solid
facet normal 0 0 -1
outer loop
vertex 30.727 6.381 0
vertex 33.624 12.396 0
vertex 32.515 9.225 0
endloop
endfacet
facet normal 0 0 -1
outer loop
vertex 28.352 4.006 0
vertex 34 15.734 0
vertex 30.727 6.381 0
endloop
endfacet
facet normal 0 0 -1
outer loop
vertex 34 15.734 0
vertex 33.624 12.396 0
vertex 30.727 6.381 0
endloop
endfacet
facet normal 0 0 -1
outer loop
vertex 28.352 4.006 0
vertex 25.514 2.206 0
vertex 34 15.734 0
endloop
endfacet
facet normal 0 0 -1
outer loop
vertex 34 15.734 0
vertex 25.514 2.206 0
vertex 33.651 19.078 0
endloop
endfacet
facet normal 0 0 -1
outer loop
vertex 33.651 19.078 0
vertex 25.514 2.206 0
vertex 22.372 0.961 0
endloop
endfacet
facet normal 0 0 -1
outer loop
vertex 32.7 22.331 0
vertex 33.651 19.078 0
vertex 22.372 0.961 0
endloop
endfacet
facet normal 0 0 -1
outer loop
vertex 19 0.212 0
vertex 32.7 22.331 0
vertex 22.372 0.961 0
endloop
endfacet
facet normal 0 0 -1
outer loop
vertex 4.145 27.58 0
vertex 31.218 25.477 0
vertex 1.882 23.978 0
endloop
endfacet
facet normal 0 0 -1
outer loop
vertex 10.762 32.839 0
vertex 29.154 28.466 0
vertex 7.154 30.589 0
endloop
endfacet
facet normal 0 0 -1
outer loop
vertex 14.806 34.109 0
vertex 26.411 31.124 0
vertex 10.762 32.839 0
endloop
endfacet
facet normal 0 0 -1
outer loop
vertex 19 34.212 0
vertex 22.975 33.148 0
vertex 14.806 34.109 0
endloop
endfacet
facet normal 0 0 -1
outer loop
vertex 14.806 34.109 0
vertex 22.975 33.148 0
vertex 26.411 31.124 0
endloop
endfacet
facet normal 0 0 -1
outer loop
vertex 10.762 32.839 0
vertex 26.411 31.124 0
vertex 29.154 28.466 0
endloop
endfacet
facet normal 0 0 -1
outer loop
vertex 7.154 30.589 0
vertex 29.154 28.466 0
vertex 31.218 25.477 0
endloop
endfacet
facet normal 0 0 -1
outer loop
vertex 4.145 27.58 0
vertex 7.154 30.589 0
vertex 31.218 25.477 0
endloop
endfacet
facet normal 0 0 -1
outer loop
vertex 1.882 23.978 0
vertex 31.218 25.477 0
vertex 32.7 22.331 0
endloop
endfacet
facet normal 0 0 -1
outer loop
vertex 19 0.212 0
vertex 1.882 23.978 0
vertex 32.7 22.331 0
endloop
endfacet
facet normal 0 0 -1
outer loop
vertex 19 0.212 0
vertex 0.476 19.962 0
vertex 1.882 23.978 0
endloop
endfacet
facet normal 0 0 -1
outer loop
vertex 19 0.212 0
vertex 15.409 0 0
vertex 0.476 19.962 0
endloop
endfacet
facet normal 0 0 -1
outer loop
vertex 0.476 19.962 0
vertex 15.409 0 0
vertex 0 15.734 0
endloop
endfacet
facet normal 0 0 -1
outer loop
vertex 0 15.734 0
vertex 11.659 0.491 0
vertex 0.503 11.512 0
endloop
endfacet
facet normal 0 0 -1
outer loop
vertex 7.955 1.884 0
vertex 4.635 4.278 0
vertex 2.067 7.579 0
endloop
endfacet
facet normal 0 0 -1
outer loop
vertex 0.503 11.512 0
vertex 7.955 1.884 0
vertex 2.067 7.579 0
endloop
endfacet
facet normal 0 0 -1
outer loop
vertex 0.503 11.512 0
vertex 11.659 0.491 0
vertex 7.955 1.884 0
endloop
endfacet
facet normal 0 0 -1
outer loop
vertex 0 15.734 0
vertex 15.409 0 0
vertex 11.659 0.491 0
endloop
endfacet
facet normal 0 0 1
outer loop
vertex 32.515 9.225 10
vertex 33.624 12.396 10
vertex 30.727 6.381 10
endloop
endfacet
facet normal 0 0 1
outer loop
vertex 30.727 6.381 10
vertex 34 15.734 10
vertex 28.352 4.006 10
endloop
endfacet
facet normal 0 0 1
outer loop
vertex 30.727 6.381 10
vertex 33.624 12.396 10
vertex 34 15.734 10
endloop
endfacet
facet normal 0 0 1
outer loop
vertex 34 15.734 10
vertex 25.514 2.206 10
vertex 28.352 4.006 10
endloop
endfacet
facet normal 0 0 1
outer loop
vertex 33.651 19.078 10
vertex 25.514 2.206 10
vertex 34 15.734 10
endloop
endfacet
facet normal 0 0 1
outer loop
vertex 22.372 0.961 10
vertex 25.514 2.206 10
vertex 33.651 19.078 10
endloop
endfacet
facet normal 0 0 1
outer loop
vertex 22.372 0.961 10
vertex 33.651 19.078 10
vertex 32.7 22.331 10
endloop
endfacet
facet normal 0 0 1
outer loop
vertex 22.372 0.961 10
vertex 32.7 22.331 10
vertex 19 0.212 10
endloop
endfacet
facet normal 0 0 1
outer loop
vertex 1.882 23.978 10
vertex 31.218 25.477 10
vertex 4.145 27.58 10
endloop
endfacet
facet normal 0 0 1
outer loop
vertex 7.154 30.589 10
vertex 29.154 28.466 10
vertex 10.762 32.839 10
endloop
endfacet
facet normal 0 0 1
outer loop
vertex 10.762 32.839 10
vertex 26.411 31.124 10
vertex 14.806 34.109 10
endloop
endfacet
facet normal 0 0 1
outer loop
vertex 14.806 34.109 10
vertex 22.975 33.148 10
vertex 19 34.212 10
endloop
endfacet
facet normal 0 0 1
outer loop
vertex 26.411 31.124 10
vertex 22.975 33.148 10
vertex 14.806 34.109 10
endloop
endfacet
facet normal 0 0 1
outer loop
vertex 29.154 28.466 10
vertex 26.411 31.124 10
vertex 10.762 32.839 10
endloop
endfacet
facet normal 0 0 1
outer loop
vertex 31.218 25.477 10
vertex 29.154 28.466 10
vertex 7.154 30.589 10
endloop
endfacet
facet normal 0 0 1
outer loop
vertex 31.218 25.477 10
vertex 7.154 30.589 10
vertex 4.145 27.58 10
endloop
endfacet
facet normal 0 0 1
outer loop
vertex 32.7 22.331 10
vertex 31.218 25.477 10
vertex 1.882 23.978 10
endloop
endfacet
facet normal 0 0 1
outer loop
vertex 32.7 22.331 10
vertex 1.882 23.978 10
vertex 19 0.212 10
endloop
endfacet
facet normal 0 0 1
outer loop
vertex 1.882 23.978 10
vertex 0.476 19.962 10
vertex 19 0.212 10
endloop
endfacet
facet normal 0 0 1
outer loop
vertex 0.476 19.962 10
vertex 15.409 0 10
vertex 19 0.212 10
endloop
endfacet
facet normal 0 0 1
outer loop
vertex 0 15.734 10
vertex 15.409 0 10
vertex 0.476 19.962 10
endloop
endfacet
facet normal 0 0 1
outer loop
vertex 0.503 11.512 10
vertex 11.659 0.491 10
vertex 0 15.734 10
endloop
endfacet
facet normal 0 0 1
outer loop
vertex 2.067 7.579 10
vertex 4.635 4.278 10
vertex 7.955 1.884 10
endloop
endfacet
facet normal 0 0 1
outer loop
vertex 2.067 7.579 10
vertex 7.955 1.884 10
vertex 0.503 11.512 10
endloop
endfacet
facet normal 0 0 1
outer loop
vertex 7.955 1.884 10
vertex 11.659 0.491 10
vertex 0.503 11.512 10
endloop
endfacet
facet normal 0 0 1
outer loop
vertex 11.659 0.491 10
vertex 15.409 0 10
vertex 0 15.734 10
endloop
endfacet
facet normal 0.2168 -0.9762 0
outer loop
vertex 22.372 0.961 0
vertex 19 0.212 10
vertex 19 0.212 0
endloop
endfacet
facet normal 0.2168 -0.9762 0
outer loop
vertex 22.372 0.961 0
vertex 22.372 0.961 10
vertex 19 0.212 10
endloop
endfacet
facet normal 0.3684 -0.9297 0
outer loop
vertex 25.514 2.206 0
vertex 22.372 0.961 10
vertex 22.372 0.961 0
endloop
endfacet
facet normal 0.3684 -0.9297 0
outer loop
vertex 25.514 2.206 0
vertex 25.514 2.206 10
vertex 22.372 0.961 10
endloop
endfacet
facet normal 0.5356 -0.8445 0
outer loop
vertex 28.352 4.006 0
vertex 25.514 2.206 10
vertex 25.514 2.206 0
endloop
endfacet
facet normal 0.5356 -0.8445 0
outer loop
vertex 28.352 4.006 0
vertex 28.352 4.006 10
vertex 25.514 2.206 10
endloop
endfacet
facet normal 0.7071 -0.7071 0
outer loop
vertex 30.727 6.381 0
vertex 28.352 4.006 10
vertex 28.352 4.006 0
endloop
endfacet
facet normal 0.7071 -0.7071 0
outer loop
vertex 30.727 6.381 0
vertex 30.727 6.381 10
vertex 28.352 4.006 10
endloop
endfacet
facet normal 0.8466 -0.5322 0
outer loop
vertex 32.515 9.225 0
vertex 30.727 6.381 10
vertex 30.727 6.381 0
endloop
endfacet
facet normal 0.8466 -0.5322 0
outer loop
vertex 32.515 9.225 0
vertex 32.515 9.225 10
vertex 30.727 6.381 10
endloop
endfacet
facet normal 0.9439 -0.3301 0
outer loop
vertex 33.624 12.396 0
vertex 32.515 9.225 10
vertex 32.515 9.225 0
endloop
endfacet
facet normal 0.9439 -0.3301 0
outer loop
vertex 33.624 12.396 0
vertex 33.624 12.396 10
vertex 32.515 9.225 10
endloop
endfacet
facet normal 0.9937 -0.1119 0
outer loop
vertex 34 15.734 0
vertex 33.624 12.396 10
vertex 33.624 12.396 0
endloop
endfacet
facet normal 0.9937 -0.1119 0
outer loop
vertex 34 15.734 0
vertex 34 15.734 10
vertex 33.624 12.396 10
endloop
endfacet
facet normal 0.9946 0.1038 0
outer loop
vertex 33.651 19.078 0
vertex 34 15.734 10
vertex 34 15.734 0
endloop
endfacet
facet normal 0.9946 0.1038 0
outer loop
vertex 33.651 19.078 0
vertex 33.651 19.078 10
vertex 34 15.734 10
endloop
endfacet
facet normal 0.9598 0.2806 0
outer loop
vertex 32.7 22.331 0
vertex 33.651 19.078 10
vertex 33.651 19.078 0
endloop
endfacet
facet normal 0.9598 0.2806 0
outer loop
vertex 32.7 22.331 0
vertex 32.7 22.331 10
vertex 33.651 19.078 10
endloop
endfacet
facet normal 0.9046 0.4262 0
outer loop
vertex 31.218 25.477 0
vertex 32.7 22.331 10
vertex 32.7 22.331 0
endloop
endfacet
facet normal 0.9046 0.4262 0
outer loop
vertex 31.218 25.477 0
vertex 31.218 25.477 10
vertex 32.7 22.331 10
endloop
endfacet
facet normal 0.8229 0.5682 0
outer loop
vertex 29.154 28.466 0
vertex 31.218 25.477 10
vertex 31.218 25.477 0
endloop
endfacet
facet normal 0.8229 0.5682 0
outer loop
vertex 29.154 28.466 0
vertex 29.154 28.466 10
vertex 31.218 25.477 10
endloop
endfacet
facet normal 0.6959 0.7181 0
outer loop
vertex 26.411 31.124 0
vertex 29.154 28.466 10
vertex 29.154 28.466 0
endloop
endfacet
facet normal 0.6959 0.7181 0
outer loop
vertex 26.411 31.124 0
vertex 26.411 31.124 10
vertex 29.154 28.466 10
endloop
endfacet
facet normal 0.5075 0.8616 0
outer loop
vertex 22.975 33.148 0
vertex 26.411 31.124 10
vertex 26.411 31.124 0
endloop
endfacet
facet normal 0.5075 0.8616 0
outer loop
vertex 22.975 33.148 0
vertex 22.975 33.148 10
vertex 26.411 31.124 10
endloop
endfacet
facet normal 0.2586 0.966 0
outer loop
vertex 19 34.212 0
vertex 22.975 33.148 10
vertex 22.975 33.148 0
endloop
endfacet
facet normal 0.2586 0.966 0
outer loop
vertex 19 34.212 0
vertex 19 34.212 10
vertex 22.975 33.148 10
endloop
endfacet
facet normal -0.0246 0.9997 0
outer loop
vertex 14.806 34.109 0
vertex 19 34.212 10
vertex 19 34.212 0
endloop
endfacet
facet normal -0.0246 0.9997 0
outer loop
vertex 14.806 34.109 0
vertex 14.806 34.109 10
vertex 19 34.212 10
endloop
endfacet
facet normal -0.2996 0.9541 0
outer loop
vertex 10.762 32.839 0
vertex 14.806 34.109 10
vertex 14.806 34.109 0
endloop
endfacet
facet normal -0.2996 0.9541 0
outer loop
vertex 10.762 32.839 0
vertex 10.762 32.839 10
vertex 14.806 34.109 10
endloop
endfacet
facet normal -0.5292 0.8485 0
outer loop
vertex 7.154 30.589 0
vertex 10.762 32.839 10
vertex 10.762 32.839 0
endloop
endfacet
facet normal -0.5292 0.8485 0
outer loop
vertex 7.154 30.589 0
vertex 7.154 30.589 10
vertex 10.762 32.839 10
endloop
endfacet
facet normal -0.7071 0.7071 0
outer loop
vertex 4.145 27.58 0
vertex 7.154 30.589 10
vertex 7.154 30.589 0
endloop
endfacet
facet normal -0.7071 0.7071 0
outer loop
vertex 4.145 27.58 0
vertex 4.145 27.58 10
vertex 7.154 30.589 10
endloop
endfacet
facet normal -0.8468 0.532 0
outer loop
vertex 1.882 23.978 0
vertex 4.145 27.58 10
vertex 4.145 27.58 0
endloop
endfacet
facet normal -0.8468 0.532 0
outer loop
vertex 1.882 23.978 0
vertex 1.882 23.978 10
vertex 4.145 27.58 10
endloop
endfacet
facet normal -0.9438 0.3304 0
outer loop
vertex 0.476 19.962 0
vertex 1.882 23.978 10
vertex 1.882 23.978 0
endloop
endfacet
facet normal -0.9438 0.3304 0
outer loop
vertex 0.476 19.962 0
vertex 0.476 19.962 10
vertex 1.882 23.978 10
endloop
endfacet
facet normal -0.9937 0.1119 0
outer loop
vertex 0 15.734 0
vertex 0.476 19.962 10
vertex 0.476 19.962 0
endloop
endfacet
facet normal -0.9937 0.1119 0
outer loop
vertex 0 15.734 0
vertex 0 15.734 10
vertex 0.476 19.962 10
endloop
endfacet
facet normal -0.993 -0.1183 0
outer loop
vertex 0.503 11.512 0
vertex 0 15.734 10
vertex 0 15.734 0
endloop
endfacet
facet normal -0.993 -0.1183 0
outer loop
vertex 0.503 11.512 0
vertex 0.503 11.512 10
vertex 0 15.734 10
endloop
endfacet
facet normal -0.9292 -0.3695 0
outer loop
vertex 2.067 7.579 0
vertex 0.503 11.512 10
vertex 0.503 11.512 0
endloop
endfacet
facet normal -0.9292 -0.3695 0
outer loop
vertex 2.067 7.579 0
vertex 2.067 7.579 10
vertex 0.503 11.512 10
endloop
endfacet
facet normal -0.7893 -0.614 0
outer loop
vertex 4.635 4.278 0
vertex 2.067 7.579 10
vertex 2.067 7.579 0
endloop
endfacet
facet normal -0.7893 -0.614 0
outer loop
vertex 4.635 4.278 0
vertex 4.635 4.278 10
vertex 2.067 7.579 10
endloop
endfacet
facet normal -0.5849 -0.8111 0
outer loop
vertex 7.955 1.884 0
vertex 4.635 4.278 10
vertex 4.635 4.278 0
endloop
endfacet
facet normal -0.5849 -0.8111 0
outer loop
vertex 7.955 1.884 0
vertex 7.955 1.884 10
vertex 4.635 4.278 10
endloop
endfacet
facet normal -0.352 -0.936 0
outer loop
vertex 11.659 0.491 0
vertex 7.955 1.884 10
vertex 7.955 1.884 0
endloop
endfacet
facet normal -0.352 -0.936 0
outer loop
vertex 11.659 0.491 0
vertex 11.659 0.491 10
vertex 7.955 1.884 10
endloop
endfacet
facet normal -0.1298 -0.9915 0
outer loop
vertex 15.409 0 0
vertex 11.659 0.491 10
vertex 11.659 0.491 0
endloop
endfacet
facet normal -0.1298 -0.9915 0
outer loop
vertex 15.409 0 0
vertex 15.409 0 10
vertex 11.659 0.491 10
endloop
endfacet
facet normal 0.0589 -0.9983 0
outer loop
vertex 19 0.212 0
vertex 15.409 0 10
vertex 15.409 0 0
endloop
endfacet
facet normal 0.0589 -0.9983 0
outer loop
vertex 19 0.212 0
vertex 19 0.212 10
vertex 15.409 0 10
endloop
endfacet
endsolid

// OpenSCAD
$fn = 32;

// ----------------------------------------------------------------------
// Cam disc: base radius 15.0 mm, lift 4.0 mm, 28 profile points
// ----------------------------------------------------------------------

// --- parameters (mm) ---
profile_height = 10;      // extrusion height
profile_points = 28;      // points of the closed outline

profile = [[34, 15.734], [33.651, 19.078], [32.7, 22.331], [31.218, 25.477], [29.154, 28.466], [26.411, 31.124], [22.975, 33.148], [19, 34.212], [14.806, 34.109], [10.762, 32.839], [7.154, 30.589], [4.145, 27.58], [1.882, 23.978], [0.476, 19.962], [0, 15.734], [0.503, 11.512], [2.067, 7.579], [4.635, 4.278], [7.955, 1.884], [11.659, 0.491], [15.409, 0], [19, 0.212], [22.372, 0.961], [25.514, 2.206], [28.352, 4.006], [30.727, 6.381], [32.515, 9.225], [33.624, 12.396]];  // single closed polygon, 28 points, counter clockwise

// --- the one profile operation ---
linear_extrude(height = profile_height) polygon(points = profile);
